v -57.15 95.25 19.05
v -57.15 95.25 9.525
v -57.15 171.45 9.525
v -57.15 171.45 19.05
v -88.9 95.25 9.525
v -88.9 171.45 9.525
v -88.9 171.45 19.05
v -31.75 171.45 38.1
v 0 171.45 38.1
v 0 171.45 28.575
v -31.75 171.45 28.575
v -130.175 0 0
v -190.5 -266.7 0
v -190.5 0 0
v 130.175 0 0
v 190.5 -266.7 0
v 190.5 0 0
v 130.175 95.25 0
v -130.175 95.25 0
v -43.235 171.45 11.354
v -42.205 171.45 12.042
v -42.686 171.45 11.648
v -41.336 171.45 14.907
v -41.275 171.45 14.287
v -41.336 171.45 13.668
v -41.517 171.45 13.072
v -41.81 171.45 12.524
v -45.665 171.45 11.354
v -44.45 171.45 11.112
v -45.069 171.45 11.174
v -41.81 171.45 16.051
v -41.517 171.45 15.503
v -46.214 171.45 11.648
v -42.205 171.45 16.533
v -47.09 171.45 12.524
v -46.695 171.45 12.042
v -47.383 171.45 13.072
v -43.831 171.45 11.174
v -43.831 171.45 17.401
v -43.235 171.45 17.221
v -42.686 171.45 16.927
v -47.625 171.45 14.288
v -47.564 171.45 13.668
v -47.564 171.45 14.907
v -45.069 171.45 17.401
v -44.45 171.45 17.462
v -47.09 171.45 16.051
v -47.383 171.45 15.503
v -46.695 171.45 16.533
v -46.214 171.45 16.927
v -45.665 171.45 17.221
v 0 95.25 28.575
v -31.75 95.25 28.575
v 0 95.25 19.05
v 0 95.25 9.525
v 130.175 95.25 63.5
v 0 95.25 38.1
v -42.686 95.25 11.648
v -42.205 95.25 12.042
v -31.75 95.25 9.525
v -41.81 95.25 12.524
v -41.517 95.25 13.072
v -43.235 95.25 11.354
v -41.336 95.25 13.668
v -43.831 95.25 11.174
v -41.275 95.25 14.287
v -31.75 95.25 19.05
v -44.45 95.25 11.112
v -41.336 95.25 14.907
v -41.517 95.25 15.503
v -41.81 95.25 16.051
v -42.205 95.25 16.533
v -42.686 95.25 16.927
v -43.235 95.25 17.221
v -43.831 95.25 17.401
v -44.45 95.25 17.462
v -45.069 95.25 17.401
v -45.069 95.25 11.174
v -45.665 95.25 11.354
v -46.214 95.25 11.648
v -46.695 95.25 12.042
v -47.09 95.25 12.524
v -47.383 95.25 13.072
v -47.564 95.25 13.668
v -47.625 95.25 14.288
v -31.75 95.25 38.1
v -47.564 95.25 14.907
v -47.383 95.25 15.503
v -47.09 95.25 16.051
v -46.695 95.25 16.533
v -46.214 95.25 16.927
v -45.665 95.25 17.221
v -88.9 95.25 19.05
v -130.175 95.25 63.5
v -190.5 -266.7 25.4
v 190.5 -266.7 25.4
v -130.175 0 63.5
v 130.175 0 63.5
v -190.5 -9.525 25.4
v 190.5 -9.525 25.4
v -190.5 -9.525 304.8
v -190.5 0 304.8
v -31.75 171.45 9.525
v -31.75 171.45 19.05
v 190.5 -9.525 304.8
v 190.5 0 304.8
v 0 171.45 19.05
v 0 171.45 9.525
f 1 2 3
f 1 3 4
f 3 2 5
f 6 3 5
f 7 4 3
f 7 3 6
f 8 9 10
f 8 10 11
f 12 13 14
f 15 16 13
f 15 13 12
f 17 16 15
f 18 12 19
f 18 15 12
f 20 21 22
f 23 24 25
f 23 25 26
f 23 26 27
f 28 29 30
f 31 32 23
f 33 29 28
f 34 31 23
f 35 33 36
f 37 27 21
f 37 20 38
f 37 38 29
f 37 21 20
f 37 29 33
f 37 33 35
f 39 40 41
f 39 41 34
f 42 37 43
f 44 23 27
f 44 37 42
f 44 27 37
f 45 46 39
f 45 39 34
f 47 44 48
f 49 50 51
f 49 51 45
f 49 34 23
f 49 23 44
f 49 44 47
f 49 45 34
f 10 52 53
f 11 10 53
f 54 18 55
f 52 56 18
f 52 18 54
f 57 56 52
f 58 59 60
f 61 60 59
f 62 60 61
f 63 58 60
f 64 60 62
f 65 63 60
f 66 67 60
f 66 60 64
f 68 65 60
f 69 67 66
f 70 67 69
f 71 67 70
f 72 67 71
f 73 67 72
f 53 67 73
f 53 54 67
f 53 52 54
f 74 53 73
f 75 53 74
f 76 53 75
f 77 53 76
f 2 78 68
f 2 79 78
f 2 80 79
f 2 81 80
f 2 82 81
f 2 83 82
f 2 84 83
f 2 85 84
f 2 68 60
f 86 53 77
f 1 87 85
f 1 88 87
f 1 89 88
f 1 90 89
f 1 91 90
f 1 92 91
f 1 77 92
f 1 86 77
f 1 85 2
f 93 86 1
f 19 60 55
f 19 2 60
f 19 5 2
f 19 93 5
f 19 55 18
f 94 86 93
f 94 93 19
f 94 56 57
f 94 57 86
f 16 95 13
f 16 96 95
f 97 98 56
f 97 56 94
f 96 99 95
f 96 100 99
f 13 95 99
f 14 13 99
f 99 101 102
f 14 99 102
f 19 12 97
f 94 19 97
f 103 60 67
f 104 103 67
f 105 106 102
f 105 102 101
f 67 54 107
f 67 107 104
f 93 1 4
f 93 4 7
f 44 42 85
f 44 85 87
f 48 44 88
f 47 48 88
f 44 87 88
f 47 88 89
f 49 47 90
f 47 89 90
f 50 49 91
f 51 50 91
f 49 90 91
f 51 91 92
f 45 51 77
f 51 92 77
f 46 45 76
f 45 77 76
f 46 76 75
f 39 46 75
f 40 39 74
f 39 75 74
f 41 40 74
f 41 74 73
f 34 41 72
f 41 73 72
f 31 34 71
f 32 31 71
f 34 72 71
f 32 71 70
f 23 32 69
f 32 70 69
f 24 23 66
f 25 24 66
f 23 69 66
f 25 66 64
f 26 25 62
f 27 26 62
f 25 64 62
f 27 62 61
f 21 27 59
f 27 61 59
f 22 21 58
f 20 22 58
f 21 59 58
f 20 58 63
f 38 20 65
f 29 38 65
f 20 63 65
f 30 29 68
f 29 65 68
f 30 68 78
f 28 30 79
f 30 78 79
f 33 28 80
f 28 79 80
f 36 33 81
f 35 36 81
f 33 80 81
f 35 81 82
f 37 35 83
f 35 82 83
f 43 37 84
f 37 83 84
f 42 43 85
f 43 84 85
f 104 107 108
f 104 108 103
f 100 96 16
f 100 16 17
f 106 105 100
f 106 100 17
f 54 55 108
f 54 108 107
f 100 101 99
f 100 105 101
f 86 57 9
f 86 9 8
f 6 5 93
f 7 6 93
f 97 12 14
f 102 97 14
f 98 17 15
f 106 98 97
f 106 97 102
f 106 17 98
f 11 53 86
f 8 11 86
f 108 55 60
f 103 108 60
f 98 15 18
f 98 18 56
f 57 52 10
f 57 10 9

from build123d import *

# Parameters (mm, degrees)
F1_DEPTH = 190.5
F2_W     = 260.35
F2_H     = 63.5
F3_DEPTH = 95.25
F4_W     = 31.75
F4_H     = 9.525
F4_R     = 3.175
F5_DEPTH = 76.2


with BuildPart() as f1:
    # F0 (on Right) → F1 (new body, symmetric)
    with BuildSketch(Plane.YZ):
        Polygon((-266.7, 25.4), (-266.7, 0), (0, 0), (0, 304.8), (-9.525, 304.8), (-9.525, 25.4), align=None)
    extrude(amount=F1_DEPTH, both=True)

    # F2 (on face) → F3 (join)
    with BuildSketch(Plane(origin=(0, 0, 0), x_dir=(-1, 0, 0), z_dir=(0, 1, 0))):
        with Locations((0, 31.75)):
            Rectangle(F2_W, F2_H)
    extrude(amount=F3_DEPTH)

    # F4 (on face) → F5 (join)
    with BuildSketch(Plane(origin=(0, 95.25, 0), x_dir=(-1, 0, 0), z_dir=(0, 1, 0))):
        with Locations((15.875, 14.2875)):
            Rectangle(F4_W, F4_H)
        with Locations((73.025, 14.2875)):
            Rectangle(F4_W, F4_H)
        with Locations((15.875, 33.3375)):
            Rectangle(F4_W, F4_H)
        with Locations((44.45, 14.2875)):
            Circle(F4_R)
    extrude(amount=F5_DEPTH)


solid = f1.part
